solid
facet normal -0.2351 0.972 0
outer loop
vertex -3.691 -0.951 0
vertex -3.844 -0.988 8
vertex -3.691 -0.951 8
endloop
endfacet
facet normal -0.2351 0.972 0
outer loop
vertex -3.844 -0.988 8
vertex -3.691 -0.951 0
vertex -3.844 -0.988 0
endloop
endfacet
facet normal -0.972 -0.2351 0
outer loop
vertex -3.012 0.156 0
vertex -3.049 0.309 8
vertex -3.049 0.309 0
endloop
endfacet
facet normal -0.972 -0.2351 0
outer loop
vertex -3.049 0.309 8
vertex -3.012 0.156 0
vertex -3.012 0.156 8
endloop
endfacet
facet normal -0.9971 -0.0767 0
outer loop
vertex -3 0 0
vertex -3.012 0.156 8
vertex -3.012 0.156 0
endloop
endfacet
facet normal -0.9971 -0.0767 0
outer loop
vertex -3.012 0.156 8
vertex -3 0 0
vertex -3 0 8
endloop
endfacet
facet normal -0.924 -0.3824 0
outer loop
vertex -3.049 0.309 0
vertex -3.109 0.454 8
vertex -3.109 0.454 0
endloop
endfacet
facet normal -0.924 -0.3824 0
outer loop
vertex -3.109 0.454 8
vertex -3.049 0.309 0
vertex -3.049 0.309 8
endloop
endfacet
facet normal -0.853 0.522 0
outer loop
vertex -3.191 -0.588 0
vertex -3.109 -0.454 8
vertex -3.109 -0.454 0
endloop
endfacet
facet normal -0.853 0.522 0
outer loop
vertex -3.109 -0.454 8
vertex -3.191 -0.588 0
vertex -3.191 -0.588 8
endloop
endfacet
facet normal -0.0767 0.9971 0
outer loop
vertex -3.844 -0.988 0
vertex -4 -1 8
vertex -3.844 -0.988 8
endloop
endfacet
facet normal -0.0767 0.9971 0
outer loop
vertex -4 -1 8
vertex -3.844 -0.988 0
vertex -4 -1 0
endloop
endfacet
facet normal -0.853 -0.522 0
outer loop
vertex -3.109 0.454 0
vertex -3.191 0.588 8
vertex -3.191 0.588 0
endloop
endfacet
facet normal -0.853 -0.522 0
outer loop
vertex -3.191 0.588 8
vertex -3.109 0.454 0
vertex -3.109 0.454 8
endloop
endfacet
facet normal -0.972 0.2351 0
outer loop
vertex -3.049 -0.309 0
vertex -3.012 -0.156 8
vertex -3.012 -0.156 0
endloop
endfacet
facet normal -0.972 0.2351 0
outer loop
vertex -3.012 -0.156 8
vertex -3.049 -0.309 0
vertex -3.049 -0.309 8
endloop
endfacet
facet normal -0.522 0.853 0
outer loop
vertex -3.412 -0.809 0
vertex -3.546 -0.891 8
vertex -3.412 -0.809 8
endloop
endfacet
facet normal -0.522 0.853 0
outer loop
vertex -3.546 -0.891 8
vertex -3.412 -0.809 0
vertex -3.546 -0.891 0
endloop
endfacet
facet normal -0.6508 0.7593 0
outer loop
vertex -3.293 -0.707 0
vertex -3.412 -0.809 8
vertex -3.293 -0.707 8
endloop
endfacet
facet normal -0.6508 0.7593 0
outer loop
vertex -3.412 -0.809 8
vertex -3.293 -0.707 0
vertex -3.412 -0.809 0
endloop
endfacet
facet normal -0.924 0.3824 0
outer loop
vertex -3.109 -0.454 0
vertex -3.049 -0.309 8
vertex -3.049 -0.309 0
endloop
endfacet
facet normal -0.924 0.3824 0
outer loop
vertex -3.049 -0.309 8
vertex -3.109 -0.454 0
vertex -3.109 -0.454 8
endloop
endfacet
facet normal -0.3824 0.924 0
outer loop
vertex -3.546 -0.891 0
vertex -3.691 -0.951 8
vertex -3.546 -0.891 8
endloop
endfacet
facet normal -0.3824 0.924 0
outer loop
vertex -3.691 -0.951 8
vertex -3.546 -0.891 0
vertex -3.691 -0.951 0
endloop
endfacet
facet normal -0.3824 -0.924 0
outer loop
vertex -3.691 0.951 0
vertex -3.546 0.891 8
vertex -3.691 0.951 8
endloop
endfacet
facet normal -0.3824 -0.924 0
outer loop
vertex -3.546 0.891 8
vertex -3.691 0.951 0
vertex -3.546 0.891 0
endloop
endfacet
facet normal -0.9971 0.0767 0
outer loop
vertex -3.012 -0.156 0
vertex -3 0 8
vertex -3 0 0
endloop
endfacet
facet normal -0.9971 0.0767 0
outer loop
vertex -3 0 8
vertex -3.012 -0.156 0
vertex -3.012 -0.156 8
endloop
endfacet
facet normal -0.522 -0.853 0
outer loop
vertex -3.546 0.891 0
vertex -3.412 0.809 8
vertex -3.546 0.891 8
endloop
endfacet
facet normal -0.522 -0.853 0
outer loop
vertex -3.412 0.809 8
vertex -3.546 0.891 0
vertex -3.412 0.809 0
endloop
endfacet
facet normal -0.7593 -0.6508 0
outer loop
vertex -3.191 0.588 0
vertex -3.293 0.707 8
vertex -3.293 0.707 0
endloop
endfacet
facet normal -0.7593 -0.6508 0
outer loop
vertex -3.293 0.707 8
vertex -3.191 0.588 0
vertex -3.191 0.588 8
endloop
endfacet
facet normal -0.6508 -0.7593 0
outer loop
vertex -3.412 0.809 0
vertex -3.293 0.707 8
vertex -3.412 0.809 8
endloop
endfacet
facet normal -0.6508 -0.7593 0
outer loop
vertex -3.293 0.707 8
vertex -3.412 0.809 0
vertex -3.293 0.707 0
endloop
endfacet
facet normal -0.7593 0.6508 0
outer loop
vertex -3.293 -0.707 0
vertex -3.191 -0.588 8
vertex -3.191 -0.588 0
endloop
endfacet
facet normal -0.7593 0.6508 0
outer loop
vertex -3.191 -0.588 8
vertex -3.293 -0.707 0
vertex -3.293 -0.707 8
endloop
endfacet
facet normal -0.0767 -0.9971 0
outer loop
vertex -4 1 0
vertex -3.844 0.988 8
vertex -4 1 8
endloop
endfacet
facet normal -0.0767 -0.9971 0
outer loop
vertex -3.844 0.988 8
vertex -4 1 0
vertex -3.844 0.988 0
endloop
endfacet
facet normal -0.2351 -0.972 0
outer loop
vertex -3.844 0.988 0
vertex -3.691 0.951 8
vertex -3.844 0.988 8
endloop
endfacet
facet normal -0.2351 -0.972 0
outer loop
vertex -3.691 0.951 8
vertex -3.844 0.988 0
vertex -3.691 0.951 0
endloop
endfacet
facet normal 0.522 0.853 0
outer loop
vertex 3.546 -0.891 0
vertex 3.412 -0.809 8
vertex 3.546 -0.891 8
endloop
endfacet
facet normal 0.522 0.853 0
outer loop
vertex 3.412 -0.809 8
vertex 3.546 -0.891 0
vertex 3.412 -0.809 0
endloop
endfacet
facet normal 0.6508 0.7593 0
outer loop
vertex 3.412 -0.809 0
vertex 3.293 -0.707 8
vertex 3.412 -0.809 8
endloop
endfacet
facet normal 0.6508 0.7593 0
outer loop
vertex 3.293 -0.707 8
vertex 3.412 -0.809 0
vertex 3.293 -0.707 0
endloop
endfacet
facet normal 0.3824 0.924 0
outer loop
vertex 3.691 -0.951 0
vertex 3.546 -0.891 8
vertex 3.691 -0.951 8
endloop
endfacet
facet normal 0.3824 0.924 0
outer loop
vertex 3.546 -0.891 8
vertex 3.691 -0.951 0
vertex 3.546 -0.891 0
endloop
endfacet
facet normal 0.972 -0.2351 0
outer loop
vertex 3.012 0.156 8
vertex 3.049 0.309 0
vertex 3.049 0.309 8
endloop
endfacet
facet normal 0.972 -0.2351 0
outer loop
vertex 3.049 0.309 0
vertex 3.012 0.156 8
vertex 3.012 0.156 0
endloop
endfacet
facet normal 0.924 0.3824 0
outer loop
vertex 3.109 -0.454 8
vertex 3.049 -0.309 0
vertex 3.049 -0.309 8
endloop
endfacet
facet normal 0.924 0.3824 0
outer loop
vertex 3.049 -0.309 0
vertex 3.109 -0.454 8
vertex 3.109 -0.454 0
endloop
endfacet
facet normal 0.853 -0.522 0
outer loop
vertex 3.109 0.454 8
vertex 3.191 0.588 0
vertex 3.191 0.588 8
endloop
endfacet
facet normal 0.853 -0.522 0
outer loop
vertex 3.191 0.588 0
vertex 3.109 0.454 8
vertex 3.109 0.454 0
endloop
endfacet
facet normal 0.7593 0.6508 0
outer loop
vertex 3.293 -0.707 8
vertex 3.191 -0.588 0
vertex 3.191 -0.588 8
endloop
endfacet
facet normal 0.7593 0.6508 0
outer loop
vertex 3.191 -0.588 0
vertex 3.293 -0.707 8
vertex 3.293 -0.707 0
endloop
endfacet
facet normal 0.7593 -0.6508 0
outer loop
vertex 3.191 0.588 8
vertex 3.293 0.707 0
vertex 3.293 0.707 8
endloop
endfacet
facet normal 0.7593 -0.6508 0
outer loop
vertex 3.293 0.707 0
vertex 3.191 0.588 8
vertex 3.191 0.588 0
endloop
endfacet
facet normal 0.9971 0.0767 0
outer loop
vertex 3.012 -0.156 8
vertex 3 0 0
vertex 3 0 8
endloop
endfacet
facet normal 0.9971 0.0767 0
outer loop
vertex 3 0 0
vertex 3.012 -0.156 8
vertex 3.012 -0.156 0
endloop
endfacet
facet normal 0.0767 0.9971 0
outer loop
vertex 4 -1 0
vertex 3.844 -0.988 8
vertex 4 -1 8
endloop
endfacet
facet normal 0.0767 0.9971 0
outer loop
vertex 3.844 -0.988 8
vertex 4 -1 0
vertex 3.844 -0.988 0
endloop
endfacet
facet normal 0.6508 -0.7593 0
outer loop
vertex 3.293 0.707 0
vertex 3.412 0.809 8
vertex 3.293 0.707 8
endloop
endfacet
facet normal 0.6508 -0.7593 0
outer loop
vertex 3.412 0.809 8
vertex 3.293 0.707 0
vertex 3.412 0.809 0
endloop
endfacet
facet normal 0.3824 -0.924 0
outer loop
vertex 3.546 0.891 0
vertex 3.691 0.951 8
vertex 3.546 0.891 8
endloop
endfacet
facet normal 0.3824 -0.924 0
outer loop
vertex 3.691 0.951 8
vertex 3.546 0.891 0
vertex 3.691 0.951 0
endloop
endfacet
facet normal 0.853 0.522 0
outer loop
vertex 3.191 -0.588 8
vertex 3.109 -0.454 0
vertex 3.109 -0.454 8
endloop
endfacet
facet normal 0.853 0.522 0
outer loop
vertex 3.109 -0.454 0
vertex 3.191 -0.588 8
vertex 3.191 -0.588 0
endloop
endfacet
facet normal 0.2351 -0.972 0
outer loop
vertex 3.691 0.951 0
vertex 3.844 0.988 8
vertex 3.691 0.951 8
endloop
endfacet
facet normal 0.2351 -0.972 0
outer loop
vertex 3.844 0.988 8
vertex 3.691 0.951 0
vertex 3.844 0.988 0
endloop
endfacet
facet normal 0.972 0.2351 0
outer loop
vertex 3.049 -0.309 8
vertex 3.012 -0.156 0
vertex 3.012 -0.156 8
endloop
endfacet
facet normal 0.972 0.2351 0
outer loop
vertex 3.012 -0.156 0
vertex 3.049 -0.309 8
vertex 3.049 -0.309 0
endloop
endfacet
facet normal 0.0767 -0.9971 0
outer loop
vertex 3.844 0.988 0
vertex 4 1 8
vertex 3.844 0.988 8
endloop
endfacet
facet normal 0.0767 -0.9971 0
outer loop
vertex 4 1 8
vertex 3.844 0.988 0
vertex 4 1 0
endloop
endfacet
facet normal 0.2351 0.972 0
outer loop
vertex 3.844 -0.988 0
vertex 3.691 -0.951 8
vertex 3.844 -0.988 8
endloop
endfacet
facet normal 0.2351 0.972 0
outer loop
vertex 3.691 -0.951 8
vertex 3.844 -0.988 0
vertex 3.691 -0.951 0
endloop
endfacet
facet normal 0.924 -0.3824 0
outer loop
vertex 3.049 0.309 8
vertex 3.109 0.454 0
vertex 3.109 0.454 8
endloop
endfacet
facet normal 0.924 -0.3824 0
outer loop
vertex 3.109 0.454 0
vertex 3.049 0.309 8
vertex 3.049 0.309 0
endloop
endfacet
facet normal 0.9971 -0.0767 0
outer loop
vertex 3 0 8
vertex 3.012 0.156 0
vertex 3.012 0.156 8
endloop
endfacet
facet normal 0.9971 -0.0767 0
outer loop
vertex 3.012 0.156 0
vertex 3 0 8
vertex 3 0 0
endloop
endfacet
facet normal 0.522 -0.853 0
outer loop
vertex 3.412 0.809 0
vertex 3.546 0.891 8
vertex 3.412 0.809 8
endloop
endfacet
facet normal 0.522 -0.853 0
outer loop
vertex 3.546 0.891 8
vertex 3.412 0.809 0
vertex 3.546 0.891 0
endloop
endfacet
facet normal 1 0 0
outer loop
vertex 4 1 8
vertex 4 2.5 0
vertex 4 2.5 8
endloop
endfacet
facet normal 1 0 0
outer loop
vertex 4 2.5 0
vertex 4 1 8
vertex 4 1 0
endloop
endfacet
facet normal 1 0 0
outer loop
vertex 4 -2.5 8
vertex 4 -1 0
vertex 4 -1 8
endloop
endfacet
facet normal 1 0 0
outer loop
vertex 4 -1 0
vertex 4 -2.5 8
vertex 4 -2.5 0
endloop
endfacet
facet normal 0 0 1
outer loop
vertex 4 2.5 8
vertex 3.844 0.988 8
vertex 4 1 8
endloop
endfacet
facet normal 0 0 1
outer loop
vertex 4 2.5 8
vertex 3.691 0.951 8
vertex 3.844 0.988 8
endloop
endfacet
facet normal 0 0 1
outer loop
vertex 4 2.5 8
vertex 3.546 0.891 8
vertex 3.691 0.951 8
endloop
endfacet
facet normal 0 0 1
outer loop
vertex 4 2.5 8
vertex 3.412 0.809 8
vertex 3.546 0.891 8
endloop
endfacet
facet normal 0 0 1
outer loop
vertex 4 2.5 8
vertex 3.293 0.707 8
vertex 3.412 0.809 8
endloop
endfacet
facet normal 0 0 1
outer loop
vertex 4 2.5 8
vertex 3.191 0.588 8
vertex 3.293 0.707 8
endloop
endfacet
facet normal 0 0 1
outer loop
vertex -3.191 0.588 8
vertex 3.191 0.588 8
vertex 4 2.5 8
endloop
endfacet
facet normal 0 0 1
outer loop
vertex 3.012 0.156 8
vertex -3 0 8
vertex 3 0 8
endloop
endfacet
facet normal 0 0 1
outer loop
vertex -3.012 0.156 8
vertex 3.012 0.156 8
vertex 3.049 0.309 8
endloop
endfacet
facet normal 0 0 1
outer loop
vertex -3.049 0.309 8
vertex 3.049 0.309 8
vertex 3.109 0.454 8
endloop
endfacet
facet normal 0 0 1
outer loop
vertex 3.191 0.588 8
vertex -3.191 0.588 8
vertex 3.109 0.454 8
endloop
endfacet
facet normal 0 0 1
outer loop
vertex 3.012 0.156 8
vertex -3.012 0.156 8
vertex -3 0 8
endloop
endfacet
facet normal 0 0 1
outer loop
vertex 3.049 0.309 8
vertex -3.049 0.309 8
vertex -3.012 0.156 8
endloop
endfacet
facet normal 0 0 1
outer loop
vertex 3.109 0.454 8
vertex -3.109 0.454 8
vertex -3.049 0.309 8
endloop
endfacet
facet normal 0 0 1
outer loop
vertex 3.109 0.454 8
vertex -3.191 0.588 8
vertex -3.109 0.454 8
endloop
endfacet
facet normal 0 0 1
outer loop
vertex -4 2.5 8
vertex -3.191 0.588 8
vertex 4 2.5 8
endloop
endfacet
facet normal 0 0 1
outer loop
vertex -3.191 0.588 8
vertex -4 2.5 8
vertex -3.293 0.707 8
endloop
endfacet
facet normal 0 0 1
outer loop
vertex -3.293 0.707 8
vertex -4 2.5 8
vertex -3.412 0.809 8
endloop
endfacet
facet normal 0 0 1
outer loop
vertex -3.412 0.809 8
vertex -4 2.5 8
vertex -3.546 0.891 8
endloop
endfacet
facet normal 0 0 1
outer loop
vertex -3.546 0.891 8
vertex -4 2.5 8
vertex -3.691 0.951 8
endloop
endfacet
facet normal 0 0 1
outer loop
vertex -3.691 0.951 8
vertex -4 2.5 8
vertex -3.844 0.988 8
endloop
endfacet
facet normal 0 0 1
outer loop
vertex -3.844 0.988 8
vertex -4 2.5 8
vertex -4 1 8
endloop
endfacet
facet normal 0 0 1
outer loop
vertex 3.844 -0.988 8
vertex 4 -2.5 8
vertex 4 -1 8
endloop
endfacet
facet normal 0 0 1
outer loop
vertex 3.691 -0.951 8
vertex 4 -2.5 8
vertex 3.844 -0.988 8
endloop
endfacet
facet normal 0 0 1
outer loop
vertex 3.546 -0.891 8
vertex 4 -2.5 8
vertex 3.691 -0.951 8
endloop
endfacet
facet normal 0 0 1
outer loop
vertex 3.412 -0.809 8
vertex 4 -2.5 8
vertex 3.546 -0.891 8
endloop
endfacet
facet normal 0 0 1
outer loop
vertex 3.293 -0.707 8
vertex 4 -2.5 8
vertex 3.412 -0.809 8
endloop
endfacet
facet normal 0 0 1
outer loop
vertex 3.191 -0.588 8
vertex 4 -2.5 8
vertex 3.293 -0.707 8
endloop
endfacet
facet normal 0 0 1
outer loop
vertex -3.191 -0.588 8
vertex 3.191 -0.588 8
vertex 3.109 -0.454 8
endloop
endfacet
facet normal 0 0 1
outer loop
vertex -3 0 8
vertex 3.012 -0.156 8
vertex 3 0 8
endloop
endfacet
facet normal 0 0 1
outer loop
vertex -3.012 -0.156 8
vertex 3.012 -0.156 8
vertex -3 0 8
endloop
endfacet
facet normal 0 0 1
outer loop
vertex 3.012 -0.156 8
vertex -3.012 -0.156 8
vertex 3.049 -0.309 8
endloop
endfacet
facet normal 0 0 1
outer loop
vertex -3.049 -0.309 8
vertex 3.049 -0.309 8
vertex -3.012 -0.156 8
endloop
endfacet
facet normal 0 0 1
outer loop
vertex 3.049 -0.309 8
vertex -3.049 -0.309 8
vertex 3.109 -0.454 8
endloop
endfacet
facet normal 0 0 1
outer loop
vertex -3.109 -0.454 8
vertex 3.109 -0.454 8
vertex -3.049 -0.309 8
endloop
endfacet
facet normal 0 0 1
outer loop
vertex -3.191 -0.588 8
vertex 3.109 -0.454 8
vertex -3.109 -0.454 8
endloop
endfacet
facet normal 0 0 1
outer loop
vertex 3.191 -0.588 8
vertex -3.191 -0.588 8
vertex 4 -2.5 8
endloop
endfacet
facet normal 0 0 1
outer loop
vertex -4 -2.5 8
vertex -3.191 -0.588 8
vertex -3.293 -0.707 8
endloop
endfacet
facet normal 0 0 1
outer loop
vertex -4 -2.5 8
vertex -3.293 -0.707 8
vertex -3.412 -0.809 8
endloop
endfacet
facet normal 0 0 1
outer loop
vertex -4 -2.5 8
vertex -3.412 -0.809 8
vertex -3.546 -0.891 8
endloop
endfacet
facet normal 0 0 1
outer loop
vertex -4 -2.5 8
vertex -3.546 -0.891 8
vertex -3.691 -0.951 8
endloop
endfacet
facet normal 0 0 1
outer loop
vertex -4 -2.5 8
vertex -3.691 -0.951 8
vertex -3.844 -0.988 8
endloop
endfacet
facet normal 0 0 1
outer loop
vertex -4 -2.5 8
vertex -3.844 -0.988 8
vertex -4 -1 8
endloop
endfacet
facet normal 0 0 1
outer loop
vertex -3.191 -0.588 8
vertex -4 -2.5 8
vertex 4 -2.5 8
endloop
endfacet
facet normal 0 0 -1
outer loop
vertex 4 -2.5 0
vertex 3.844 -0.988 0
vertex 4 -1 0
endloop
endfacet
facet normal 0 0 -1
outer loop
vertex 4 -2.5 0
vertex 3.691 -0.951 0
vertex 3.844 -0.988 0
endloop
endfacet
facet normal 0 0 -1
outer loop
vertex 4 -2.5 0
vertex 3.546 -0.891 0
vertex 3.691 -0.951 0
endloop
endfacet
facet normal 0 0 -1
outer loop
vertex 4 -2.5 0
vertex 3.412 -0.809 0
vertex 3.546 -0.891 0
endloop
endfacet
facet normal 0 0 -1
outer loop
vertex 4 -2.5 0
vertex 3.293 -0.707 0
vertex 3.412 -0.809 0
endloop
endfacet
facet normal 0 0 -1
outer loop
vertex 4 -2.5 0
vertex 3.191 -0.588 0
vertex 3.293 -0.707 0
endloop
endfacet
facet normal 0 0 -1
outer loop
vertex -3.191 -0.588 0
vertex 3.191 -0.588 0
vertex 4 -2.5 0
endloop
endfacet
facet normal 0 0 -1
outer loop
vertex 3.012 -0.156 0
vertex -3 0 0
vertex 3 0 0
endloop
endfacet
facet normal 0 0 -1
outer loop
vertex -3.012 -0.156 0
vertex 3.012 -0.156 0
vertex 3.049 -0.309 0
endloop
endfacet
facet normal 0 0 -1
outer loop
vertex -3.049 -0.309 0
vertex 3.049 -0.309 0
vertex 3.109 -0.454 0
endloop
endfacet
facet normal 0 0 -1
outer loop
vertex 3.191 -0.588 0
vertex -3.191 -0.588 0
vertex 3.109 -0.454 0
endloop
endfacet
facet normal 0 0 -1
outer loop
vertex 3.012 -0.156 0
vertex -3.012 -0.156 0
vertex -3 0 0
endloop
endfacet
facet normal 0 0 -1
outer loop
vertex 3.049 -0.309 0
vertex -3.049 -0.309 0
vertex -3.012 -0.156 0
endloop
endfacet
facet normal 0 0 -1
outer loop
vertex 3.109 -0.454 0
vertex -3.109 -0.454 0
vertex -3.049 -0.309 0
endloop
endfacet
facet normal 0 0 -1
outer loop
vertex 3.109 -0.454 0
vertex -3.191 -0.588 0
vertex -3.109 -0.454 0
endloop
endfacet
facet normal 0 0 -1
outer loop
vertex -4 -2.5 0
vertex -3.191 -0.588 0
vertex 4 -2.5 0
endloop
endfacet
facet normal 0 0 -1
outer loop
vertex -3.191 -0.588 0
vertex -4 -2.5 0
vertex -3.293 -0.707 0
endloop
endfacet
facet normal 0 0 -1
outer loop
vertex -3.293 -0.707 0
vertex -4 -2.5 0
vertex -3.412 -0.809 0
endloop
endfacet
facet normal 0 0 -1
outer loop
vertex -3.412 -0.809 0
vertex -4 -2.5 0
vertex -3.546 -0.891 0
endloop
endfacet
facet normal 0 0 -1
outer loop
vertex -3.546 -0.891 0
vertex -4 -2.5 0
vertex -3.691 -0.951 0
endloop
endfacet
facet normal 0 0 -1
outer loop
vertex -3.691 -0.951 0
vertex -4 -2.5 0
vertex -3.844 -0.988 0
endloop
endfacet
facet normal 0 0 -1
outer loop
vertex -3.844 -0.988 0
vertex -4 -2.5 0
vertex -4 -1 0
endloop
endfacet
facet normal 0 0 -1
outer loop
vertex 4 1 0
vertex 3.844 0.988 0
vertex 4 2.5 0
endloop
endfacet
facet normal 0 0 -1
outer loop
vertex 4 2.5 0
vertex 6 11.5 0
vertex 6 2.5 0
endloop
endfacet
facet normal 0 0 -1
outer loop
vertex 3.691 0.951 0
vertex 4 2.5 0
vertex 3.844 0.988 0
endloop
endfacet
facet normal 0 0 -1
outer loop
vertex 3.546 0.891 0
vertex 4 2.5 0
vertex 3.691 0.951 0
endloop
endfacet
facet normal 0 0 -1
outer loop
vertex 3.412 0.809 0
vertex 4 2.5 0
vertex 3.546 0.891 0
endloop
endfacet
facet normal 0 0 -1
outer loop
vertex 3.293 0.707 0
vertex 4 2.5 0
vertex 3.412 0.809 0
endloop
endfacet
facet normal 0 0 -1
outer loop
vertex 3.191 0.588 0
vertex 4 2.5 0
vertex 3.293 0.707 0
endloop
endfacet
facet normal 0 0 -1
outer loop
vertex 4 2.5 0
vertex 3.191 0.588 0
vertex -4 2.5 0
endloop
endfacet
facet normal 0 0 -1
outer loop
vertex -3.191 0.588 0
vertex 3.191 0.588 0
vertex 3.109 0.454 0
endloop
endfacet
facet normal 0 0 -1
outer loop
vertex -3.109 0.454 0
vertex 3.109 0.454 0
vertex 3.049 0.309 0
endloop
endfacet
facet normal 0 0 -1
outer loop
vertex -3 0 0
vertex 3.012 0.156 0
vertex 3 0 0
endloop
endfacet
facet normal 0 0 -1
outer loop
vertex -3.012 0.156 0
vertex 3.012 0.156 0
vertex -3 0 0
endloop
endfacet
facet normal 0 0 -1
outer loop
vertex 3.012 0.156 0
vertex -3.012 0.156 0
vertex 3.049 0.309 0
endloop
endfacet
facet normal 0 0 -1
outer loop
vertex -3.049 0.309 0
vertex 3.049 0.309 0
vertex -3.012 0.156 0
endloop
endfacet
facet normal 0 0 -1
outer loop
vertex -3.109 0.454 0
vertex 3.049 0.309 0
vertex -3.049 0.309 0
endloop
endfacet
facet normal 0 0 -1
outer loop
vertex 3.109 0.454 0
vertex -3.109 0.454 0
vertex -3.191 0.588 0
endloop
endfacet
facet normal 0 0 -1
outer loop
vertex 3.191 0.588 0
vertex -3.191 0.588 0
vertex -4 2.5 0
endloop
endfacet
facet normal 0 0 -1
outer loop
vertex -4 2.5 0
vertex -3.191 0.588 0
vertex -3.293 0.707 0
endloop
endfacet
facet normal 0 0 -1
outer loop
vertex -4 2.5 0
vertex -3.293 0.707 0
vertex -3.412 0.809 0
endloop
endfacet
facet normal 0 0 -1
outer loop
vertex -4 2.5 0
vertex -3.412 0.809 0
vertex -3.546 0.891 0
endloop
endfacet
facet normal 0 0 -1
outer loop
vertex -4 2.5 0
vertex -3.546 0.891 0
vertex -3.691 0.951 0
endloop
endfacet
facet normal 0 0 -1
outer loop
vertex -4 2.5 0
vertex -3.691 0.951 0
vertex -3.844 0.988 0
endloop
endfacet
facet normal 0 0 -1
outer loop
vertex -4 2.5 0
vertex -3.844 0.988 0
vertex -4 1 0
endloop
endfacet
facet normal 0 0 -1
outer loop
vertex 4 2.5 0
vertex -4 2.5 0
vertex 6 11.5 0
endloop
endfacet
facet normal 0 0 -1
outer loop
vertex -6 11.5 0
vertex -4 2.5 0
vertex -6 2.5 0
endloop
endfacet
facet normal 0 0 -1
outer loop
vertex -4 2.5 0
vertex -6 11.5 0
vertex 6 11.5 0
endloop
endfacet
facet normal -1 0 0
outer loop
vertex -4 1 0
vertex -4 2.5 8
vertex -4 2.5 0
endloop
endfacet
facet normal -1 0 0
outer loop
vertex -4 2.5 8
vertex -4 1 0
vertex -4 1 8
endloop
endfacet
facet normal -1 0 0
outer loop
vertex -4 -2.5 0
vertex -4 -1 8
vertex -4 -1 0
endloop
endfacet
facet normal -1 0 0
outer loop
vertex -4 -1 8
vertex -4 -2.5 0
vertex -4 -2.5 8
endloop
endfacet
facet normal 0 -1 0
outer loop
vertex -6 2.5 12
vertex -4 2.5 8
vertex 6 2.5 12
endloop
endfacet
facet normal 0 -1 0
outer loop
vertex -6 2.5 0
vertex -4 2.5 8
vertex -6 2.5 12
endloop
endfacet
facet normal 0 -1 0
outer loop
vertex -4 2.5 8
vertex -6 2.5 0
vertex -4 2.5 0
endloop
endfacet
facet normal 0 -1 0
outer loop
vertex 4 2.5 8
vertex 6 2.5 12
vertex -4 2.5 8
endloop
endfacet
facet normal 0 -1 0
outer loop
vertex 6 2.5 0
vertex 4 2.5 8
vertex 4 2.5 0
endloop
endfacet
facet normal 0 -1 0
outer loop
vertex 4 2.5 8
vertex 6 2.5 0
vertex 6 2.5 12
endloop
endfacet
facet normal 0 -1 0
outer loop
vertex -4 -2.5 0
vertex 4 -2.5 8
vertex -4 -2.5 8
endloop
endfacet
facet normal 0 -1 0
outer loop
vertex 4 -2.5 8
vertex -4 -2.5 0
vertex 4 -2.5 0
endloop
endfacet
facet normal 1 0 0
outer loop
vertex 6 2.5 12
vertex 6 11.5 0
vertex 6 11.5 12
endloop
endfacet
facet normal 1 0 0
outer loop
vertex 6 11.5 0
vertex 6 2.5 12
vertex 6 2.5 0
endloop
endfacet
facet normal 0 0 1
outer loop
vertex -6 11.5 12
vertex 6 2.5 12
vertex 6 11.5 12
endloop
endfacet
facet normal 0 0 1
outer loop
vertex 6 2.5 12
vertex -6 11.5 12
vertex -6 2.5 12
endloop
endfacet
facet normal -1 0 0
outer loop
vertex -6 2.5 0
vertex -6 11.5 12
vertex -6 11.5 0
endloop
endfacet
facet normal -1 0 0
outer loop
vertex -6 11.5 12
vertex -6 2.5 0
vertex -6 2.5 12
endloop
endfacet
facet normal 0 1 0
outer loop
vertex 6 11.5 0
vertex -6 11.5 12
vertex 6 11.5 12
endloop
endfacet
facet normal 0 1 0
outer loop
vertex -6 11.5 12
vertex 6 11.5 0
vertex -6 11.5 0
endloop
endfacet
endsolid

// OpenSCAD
//define variables and set defaults
smoothness=40;
$fn=smoothness;
clip_height=8;
clip_width=8;
clip_thickness=5;
half_circle_diameter=2;
brace_height=12;
brace_width=12;
brace_thickness=9;
holes="side_by_side"; //[side_by_side,centered]
center_hole_depth=.825;
distance_to_wall_from_center_of_half_circles=(clip_thickness/2)+brace_thickness;

// adjustable clip part
module clip (){
    difference (){
        translate ([-clip_width/2,-clip_thickness/2,0]) cube ([clip_width,clip_thickness,clip_height]);
        if(holes=="side_by_side") {
            translate ([-clip_width/2,0,-.25]) cylinder (d=half_circle_diameter,h=clip_height+.5);
        translate ([clip_width/2,0,-.25]) cylinder (d=half_circle_diameter,h=clip_height+.5);
        }
        if(holes=="centered") {
            translate ([0,(-clip_thickness/2)*center_hole_depth,-.25]) cylinder (d=half_circle_diameter,h=clip_height+.5);
    }
}

}

// adjustable filler spacer
module brace (){
    translate([-brace_width/2,clip_thickness/2,0]) cube ([brace_width,brace_thickness,brace_height]);
}

// build it 
clip();
brace();

//output distance messages
echo ("distance to wall from center of half circles in mm");
echo (distance_to_wall_from_center_of_half_circles);
echo (holes);
